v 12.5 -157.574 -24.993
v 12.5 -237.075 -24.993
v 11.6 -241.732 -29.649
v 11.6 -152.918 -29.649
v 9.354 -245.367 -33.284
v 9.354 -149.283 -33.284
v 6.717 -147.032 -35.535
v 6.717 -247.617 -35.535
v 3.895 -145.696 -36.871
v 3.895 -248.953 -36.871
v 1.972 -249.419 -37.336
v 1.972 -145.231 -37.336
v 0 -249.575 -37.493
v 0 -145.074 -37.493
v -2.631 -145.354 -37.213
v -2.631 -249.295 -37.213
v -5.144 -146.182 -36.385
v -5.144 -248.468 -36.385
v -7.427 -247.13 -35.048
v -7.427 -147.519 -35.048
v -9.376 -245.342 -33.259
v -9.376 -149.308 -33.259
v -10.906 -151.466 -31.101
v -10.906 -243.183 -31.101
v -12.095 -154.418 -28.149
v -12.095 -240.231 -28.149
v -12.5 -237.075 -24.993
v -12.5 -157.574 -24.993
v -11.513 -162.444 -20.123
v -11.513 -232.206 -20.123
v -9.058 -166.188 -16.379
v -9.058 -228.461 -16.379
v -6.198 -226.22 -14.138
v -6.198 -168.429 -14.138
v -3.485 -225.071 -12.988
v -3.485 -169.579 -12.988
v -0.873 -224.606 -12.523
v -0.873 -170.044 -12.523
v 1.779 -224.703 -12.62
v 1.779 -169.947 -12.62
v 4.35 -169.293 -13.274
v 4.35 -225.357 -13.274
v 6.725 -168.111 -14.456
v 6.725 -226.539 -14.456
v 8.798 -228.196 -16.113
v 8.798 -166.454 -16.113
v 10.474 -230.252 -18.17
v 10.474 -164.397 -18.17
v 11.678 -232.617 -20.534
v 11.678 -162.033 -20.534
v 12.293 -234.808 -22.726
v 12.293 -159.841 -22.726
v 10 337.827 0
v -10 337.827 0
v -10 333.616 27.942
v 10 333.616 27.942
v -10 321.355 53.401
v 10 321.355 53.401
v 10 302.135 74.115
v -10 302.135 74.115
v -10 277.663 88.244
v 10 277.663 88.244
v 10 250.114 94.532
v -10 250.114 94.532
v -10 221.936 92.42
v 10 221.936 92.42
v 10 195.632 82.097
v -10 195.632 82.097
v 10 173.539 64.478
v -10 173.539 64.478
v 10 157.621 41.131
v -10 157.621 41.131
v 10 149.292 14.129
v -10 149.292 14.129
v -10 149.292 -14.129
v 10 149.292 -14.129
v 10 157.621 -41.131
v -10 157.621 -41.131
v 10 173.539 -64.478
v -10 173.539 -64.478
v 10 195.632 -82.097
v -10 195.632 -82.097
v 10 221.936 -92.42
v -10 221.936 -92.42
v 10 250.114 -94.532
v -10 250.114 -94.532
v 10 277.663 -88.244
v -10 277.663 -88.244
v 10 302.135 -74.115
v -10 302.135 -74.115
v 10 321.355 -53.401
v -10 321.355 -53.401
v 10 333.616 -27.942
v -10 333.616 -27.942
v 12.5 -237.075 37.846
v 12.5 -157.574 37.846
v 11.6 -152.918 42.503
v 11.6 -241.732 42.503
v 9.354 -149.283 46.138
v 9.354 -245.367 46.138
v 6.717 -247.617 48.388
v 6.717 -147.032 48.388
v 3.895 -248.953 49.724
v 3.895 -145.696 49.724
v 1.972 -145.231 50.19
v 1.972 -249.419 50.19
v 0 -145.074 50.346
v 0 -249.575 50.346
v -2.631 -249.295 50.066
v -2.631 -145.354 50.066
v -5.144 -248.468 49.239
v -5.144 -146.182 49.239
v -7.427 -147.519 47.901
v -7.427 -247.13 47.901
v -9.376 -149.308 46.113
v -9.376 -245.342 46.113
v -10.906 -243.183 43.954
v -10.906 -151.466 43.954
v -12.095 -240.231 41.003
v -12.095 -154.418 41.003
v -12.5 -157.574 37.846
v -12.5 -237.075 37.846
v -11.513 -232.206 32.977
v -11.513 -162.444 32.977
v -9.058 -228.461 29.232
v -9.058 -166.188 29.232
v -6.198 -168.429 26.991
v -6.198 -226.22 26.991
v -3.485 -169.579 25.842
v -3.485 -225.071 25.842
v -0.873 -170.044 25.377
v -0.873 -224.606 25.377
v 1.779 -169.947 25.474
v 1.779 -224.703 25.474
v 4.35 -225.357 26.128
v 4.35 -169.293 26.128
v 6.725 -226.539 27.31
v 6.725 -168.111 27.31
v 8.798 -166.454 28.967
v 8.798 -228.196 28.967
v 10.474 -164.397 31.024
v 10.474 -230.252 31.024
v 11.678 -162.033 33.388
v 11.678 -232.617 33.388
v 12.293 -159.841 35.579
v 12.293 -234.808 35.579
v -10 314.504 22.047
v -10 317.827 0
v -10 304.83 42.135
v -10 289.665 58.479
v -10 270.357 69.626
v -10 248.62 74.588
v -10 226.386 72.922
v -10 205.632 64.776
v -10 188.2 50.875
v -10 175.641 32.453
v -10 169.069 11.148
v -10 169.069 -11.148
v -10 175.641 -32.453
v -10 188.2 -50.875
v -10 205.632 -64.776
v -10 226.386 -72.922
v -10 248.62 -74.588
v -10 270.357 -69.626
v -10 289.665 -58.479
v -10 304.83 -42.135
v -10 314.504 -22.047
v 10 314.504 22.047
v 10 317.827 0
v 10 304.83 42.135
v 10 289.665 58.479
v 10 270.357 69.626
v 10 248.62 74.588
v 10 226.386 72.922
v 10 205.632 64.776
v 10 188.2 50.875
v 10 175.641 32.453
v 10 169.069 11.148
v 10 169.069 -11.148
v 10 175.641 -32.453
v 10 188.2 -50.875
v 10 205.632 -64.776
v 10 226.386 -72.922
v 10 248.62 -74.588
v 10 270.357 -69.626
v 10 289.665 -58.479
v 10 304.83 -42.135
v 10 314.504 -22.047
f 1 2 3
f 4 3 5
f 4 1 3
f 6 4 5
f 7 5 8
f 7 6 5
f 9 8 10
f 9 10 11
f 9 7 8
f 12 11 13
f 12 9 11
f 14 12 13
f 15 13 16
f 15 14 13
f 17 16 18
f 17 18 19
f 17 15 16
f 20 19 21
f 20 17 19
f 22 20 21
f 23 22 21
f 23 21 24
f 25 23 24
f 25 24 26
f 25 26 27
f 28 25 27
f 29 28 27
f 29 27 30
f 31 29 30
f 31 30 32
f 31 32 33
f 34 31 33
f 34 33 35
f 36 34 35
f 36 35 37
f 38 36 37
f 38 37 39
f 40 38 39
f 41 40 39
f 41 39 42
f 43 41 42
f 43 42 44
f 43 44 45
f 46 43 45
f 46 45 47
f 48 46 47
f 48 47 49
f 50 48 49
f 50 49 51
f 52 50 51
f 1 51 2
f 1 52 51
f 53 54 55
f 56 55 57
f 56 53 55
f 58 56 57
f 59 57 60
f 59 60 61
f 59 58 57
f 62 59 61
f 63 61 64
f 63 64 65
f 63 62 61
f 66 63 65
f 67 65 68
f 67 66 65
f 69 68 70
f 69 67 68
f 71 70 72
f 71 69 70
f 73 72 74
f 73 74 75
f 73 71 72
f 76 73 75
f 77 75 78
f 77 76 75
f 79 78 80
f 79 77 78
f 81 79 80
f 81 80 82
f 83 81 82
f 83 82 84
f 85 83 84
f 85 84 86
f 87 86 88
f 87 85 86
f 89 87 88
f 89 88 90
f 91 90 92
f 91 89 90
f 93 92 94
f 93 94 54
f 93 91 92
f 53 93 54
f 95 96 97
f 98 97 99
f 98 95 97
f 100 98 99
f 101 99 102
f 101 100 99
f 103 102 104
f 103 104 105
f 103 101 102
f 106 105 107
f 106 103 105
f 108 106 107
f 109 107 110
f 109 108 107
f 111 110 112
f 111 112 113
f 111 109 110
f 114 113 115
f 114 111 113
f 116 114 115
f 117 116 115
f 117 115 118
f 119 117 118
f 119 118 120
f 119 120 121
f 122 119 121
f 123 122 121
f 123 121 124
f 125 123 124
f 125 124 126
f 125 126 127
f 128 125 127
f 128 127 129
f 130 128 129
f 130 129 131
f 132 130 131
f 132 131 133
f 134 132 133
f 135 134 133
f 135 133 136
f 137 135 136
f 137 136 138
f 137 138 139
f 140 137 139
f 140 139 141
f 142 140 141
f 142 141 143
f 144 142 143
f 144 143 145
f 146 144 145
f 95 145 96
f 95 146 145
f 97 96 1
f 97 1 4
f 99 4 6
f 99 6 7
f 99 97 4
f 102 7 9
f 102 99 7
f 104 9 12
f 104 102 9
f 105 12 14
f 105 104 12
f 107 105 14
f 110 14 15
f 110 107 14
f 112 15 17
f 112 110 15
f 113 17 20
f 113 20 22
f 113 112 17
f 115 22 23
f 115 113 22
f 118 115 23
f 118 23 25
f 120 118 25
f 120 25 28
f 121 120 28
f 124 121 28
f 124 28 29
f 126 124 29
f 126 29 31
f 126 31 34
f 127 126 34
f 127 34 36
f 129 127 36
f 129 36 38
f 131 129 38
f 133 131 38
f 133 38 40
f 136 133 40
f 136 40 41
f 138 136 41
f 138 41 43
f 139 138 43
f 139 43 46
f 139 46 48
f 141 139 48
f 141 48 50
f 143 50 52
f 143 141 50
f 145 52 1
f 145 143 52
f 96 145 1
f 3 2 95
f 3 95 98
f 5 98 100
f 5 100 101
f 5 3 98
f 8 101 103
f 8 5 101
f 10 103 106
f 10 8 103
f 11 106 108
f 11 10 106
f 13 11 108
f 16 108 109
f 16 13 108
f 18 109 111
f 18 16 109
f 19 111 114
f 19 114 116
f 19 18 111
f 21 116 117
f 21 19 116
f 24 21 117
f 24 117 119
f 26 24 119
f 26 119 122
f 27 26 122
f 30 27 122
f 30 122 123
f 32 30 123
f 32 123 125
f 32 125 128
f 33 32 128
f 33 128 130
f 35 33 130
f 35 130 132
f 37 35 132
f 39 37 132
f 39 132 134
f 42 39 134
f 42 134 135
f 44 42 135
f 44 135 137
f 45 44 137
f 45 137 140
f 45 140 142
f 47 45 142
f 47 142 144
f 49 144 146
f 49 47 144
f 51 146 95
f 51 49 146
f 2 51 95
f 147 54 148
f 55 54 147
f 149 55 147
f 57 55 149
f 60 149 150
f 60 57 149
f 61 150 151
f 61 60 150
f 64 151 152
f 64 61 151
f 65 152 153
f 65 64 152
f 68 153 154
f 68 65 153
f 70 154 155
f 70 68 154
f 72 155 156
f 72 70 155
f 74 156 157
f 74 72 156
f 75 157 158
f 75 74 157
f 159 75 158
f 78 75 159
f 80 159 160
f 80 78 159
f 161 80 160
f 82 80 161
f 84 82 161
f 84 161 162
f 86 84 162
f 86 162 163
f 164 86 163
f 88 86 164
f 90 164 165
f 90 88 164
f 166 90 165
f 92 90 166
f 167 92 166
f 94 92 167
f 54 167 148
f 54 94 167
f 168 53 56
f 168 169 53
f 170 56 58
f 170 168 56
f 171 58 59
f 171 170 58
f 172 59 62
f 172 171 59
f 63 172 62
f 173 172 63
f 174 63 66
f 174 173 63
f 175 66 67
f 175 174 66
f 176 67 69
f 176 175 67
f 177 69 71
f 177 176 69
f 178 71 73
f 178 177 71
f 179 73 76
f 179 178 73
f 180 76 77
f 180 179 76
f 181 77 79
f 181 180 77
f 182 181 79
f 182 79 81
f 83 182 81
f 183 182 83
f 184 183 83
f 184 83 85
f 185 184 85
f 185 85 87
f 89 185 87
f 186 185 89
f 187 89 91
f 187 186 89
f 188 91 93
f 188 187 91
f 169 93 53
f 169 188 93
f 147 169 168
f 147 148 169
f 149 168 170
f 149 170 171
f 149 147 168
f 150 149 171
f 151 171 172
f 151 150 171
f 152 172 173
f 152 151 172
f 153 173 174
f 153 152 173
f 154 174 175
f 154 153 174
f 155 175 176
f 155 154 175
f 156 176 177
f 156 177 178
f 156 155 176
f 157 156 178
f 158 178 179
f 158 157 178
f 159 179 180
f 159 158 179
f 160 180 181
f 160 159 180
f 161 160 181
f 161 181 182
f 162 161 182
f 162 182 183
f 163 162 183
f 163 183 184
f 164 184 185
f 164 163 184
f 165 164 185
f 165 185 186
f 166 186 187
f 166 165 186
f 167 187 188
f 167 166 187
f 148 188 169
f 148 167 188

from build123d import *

# Parameters (mm, degrees)
F5_R = 12.5
F8_W = 20
F8_H = 20


# Not quite as in the source:
# - the program builds the solid bodies; features that only make, move or delete a surface that nothing else refers to are left out


with BuildPart() as f6:
    # F6: sweep along a path in F4
    with BuildLine(Plane.YZ) as f6_path:
        Line((-237.0753139257, 37.8463640809), (-237.0753139257, -24.9928794801))
        Line((-237.0753139257, -24.9928794801), (-157.574146986, -24.9928794801))
        Line((-157.574146986, -24.9928794801), (-157.574146986, 37.8463640809))
        Line((-157.574146986, 37.8463640809), (-237.0753139257, 37.8463640809))
    # F5 (on Top) → F6 (sweep)
    with BuildSketch(Plane.XY):
        with Locations((0, -237.0753139257)):
            Circle(F5_R)
    sweep(path=f6_path.line, transition=Transition.RIGHT)


with BuildPart() as f9:
    # F9: sweep along a path in F7
    with BuildLine(Plane.YZ) as f9_path:
        CenterArc((243.0302351713, 0), 50, 0, 360)
    # F8 (on Top) → F9 (sweep)
    with BuildSketch(Plane.XY):
        with Locations((0, 158.2333147526)):
            Rectangle(F8_W, F8_H)
    sweep(path=f9_path.line)


solid = Compound([f6.part, f9.part])
